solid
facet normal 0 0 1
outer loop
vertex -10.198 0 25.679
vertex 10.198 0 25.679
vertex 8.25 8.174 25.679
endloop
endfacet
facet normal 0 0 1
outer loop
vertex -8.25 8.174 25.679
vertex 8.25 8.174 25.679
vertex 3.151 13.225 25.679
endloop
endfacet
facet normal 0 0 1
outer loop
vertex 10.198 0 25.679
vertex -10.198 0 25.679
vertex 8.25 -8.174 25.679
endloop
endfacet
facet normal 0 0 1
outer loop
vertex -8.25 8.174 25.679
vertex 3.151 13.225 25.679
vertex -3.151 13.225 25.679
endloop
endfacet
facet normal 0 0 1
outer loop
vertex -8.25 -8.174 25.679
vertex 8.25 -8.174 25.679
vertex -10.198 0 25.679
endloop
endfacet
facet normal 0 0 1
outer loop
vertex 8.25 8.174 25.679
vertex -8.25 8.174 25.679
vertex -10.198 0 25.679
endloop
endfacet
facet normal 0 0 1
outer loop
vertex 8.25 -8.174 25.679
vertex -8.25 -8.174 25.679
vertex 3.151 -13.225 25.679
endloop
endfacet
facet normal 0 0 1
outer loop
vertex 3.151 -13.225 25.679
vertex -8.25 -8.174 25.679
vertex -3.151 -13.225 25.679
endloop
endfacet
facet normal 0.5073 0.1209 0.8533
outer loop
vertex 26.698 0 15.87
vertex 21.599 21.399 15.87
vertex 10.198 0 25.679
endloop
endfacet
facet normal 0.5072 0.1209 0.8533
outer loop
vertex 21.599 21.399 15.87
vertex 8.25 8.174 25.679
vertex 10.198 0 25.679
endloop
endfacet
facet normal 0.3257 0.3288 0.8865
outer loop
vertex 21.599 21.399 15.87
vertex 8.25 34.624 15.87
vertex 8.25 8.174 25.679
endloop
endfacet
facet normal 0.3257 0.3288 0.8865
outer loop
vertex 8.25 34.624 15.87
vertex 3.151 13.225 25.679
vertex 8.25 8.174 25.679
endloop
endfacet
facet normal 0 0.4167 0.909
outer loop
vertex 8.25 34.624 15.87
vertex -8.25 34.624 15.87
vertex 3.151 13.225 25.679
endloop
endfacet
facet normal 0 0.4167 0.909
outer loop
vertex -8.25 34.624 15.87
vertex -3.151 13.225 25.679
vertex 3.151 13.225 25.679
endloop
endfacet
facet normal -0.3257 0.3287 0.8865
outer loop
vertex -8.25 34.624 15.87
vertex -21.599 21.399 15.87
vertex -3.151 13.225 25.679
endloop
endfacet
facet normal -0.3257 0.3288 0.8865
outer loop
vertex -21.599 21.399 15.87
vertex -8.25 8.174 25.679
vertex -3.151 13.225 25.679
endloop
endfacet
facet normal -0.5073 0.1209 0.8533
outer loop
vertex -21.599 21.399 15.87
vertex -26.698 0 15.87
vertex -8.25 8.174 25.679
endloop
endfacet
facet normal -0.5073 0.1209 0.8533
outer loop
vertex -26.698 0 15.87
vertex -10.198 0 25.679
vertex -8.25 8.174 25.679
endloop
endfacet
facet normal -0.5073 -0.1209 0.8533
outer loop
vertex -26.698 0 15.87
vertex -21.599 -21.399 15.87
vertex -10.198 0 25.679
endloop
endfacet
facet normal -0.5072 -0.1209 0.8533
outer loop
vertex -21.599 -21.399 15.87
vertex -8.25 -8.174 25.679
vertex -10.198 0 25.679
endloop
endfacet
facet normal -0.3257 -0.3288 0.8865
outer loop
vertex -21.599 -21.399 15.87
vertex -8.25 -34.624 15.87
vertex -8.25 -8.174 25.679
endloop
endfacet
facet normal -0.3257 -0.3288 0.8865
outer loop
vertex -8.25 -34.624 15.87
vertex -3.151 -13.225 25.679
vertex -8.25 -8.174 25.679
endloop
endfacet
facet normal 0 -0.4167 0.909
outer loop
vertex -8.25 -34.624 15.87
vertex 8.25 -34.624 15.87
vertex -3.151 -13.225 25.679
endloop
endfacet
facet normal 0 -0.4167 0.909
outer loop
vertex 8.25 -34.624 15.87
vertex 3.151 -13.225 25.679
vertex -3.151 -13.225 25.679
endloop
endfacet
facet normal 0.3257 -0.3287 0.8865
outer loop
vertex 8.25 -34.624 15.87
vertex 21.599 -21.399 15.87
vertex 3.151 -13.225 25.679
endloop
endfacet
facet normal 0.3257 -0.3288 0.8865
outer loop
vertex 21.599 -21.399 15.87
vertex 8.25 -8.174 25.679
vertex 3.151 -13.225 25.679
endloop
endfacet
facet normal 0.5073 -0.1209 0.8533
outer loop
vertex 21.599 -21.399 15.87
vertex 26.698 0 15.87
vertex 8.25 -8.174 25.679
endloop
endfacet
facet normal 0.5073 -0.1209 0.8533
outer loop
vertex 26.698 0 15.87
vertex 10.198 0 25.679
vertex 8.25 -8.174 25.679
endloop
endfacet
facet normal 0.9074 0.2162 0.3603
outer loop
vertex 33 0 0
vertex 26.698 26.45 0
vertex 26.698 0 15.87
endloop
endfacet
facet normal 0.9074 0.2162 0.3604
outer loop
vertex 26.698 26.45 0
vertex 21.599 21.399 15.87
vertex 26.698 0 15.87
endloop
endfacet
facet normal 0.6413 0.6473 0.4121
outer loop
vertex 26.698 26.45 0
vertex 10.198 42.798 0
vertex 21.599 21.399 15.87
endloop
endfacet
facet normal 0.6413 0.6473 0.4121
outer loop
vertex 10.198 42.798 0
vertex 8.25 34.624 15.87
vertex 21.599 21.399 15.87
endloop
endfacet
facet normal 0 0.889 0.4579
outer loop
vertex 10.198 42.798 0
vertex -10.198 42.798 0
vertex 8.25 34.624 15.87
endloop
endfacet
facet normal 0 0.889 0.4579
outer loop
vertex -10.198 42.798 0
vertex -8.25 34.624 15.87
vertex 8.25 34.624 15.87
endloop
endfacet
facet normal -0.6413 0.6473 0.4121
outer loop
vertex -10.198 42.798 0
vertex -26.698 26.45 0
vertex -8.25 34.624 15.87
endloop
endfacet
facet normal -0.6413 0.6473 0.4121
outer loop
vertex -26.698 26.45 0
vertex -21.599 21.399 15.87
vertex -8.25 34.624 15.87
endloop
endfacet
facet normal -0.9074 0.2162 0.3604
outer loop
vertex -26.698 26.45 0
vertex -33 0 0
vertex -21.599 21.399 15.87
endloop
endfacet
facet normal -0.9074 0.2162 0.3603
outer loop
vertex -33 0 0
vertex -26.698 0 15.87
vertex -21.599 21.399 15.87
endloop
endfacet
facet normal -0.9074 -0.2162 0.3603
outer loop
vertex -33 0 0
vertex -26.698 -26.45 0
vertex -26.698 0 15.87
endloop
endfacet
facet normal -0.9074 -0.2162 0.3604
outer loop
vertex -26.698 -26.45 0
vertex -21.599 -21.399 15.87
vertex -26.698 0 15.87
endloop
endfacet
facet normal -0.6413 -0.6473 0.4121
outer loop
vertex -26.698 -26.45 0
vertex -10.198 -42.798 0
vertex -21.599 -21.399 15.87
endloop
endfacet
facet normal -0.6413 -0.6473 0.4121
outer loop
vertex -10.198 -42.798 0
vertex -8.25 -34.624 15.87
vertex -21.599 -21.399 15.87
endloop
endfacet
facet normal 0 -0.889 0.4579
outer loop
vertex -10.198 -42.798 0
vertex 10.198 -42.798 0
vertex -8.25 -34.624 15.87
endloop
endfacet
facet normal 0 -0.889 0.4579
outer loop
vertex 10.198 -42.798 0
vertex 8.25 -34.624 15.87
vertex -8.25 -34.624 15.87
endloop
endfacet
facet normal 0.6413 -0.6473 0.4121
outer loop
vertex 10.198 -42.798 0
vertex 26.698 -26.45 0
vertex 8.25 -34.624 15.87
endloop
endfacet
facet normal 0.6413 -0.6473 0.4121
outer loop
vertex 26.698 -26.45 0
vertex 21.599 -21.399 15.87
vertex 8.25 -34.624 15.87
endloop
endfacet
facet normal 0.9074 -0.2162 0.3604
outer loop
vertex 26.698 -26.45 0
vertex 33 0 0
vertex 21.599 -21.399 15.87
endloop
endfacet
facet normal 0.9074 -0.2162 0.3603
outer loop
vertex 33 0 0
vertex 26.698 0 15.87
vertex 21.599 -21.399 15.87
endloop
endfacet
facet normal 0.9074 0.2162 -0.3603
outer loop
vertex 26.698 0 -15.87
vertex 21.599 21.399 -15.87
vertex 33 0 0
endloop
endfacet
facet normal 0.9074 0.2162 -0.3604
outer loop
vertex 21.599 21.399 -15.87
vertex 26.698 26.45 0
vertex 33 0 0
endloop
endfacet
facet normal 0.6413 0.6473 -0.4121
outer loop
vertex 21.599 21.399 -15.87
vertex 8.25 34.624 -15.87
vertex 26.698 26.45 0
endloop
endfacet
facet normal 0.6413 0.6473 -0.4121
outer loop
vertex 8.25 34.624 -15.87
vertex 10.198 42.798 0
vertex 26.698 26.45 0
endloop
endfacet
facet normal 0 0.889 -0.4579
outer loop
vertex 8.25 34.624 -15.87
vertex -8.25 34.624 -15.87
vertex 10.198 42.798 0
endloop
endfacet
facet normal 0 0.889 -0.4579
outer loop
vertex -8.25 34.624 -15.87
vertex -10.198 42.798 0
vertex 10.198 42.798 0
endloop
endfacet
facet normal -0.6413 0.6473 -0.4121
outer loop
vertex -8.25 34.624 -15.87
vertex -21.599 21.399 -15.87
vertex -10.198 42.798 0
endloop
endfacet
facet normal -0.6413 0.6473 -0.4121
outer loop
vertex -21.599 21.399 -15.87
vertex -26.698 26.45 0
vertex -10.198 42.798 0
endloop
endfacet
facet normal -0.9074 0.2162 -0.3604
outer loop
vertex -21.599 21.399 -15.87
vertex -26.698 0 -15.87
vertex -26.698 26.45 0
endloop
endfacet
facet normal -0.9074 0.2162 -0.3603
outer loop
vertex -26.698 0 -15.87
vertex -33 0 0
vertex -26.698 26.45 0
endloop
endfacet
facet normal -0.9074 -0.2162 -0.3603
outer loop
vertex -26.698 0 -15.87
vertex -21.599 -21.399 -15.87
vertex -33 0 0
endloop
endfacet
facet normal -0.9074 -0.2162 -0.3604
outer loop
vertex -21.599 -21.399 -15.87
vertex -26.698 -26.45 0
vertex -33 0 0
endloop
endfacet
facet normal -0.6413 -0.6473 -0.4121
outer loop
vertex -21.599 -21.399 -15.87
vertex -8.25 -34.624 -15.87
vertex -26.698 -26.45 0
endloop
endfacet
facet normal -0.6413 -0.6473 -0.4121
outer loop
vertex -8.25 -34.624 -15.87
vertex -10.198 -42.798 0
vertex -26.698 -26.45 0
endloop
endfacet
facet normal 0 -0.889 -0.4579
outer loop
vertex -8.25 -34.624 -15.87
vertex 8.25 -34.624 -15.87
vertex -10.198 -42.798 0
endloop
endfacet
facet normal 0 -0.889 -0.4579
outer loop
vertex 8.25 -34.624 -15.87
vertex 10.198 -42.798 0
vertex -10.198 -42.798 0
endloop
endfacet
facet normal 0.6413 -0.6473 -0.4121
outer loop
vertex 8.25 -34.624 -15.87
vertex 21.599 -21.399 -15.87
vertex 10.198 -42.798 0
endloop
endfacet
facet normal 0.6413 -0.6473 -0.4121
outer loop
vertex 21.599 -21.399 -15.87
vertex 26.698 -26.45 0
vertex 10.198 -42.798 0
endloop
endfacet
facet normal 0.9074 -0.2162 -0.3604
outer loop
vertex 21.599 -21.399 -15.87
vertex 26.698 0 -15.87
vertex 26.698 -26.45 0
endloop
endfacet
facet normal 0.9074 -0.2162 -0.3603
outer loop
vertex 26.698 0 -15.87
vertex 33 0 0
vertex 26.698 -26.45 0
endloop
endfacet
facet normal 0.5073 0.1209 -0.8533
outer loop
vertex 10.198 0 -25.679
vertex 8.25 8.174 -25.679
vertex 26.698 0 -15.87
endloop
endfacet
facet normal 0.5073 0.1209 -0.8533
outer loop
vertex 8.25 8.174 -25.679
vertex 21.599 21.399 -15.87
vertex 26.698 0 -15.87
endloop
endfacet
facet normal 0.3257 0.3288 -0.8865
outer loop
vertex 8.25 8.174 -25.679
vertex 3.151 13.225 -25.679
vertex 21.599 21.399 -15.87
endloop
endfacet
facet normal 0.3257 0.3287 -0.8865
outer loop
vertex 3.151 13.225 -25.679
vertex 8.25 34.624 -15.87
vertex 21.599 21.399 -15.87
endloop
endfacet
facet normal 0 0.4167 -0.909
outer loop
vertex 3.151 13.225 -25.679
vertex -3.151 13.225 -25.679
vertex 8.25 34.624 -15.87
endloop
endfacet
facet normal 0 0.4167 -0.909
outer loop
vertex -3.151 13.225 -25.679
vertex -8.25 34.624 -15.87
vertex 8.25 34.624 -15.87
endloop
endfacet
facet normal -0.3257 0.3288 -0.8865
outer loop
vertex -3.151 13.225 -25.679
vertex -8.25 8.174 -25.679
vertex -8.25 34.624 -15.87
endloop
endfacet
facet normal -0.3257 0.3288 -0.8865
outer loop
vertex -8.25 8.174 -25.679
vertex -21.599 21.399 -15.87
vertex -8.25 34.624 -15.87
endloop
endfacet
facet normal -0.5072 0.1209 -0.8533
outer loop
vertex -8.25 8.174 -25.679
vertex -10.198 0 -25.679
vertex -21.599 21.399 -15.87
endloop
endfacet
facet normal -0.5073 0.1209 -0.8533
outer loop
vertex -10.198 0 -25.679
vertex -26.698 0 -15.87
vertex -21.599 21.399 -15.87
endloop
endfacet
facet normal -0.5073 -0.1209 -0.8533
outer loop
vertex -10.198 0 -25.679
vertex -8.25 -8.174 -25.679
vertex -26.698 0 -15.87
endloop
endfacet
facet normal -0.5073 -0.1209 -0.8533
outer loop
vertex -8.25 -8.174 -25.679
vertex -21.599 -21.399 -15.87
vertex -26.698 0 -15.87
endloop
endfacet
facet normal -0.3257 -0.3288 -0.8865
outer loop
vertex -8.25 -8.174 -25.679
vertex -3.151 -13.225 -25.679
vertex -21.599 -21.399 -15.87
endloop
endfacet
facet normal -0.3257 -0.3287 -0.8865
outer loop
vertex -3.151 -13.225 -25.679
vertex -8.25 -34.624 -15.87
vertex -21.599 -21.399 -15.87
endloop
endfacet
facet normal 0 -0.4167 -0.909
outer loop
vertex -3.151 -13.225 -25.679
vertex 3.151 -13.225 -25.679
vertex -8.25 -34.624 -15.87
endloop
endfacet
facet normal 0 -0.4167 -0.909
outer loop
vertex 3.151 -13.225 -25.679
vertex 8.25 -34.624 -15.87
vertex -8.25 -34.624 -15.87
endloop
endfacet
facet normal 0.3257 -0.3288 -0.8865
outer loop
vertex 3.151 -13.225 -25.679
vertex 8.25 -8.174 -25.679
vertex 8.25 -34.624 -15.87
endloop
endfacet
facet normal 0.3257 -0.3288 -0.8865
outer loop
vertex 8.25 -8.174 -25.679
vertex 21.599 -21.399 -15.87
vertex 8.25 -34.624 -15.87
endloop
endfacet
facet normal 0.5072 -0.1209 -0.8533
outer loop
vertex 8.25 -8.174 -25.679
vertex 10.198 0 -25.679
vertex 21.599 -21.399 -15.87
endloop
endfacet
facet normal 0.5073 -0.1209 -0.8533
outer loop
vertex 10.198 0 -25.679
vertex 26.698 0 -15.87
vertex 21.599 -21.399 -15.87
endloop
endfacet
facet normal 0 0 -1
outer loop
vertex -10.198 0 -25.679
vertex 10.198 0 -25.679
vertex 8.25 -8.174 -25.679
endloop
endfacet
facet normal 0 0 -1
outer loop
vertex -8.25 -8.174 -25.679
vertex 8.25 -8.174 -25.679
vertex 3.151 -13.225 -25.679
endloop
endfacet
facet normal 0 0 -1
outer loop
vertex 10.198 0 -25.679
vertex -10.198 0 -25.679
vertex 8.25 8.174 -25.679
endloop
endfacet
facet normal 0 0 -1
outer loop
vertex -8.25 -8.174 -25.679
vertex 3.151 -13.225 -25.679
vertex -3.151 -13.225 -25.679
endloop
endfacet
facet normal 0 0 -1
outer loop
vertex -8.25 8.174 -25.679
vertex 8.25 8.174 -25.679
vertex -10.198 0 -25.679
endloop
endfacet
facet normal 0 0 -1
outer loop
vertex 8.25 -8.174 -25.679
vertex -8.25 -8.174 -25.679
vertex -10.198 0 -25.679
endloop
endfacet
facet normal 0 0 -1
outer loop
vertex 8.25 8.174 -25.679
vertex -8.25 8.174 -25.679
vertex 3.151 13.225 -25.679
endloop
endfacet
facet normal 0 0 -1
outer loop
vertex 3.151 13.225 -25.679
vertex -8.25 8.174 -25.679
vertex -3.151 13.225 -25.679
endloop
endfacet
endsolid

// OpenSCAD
// Generated by SolidPython 1.0.1 on 2020-07-29 00:46:50


scale(v = [11, 15, 9]) {
	sphere(r = 3);
}
/***********************************************
*********      SolidPython code:      **********
************************************************
 
# import packages: SolidPython
from solid import *
from solid.utils import *
from itertools import chain, combinations, permutations


class Resize:

    def __init__(self, scad_file):
        self.scad_file = scad_file
        #self.scad_file = import_scad(scad_file)
        # cone/cylinder param:
        self.r1 = 0
        self.r2 = 0
        self.h = 0
        # rectangular prism param:
        self.w = 0
        self.l = 0
        # ellipse param:
        self.r = 0

    # import OpenScad code (file name corresponds to shape)


    # classify shape + parameters
    def assign(self, param1, param2, param3):
        if self.scad_file == 'cone.scad':
            self.r1 = param1
            self.r2 = param2
            self.h = param3
        elif self.scad_file == 'cylinder.scad':
            self.r1 = param1
            self.r2 = param2
            self.h = param3
        elif self.scad_file == 'rectangularPrism.scad':
            self.h = param1
            self.l = param2
            self.w = param3
        else:
            self.r = param1
            self.h = param2

    # resize parameters
    def iterate(self):
        x = range(3, 20, 2)
        i = 1
        if self.scad_file == 'cone.scad':
            tempList = list(permutations(x, 2))
            for temp in tempList:
                param1 = temp[0]
                param2 = temp[1]
                filepath = 'produced_scad_files/' + 'cone' + str(param1) + '_' + str(param2) + '_' + '.scad'
                scad_render_to_file(cylinder(h=param1, r1=param2, r2=0), filepath)

        elif self.scad_file == 'cylinder.scad':
            tempList = list(permutations(x, 3))
            for temp in tempList:
                param1 = temp[0]
                param2 = temp[1]
                filepath = 'produced_scad_files/' + 'cylinder' + str(param1) + '_' + str(param2) + '_' + '.scad'
                scad_render_to_file(cylinder(h=param1, r1=param2, r2=param2), filepath)

        elif self.scad_file == 'rectangularPrism.scad':
            tempList = list(permutations(x, 3))
            for temp in tempList:
                param1 = temp[0]
                param2 = temp[1]
                param3 = temp[2]
                filepath = 'produced_scad_files/' + 'rectangularPrism' + str(param1) + '_' + str(param2) + '_' + str(
                    param3) + '.scad'
                scad_render_to_file(cube(size=(param1, param2, param3)), filepath)

        elif self.scad_file == 'ellipse.scad':
            tempList = list(permutations(x, 4))
            for temp in tempList:
                param1 = temp[0]
                param2 = temp[1]
                param3 = temp[2]
                param4 = temp[3]
                filepath = 'produced_scad_files/' + 'ellipse' + str(param1) + '_' + str(param2) + '_' + str(param3) + '_' + str(param4) + '.scad'
                scad_render_to_file(scale([param1, param2, param3])(sphere(r=param4)), filepath)

    def render_to_scadfile(self):
        scad_render_to_file(scad, 'example.scad') 
 
************************************************/
